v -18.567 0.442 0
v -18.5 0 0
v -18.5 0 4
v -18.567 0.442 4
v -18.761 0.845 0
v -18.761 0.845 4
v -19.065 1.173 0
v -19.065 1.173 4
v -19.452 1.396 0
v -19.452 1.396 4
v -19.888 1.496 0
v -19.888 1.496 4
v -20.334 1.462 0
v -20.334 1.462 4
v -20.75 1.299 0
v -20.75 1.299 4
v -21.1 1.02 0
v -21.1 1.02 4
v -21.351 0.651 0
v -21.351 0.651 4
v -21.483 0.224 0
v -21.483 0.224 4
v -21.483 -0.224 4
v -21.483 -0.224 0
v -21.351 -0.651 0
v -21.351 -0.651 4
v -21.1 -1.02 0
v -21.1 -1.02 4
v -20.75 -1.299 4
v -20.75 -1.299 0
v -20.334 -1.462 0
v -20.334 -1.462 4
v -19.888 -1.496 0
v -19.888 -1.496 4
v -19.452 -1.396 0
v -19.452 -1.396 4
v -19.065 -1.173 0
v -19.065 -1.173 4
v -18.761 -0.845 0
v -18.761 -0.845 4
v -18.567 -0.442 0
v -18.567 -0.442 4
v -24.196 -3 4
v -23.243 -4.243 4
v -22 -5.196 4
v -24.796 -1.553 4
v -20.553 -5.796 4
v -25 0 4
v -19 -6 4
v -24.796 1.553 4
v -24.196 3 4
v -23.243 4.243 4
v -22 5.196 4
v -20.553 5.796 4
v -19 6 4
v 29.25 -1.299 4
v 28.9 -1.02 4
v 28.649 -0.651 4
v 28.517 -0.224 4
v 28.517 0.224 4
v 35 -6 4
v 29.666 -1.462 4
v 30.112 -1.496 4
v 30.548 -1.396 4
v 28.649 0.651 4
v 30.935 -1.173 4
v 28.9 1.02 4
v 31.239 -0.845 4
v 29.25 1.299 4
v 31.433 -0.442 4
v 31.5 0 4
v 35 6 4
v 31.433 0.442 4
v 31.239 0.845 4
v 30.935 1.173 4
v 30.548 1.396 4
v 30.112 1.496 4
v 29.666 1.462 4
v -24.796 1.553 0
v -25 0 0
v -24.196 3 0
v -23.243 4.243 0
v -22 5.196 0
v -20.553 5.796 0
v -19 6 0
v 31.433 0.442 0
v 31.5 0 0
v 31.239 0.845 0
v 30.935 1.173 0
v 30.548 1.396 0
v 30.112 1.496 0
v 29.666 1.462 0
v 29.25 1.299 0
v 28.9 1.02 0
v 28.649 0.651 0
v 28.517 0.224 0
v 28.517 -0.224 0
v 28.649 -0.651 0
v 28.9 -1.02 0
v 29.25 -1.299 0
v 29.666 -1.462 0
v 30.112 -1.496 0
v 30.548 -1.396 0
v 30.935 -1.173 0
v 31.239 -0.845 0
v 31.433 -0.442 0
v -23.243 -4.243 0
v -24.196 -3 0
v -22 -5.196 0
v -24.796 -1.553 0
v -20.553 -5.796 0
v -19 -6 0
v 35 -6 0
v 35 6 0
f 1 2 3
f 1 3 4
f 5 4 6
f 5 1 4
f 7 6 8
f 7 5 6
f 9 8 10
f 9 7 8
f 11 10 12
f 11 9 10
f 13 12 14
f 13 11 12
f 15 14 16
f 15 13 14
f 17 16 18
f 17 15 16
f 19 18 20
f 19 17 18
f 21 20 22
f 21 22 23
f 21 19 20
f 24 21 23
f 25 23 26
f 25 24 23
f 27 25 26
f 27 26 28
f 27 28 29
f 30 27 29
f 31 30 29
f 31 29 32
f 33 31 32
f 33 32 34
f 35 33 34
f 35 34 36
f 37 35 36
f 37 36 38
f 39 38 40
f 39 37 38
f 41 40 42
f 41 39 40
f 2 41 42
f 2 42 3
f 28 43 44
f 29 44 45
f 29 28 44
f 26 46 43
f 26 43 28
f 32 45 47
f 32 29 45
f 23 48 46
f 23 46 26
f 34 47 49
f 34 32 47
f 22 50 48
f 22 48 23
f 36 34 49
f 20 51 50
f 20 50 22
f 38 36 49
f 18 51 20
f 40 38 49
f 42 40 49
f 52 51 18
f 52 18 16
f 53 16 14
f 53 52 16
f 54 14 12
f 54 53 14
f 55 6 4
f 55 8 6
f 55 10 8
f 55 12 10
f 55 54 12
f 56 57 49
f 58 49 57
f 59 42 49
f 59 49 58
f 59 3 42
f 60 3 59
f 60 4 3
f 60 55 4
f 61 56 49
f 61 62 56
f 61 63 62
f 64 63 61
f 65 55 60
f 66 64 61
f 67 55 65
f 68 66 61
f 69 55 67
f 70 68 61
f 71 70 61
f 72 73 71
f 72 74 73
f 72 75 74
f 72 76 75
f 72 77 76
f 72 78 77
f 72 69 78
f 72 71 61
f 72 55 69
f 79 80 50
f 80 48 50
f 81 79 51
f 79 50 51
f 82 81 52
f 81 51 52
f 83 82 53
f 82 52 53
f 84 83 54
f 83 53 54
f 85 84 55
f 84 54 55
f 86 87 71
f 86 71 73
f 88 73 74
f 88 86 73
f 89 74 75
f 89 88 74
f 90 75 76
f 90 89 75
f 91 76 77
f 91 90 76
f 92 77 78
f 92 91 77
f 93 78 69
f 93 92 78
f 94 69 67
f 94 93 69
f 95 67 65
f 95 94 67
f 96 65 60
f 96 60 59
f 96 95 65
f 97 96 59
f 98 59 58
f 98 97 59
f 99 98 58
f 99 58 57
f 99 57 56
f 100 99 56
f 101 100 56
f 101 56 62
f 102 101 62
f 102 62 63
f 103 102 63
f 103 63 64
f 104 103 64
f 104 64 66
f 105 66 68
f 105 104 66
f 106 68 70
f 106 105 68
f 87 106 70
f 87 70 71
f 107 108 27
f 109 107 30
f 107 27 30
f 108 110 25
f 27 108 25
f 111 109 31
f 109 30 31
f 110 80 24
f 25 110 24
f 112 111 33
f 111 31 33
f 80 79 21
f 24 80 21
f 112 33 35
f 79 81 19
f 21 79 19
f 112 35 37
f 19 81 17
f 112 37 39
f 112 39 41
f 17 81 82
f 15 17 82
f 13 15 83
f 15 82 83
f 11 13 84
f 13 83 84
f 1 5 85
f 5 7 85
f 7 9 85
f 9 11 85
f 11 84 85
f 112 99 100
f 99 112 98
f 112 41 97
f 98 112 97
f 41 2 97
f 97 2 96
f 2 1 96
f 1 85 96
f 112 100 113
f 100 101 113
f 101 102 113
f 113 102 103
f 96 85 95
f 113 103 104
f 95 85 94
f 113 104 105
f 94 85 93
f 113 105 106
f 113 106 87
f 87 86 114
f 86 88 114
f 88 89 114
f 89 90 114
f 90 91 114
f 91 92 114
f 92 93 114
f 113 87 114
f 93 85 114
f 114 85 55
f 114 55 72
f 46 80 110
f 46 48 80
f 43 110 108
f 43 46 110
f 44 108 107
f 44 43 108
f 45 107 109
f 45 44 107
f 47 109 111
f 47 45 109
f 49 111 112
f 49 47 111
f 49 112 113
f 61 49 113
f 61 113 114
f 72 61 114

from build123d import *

# Parameters (mm, degrees)
SKETCH_1_W      = 60
SKETCH_1_H      = 12
SKETCH_1_R      = 1.5
EXTRUDE_1_DEPTH = 4
FILLET_1_R      = 6


with BuildPart() as part:
    # 草图1 → 凸台-拉伸1 (new body)
    with BuildSketch(Plane.XY):
        with Locations((5, 0)):
            Rectangle(SKETCH_1_W, SKETCH_1_H)
        with Locations((-20, 0)):
            Circle(SKETCH_1_R, mode=Mode.SUBTRACT)
        with Locations((30, 0)):
            Circle(SKETCH_1_R, mode=Mode.SUBTRACT)
    extrude(amount=EXTRUDE_1_DEPTH)

    # 圆角1
    fillet_1_edges = [part.edges().sort_by_distance(p)[0] for p in [
        (-25, -6, 2),
        (-25, 6, 2),
    ]]
    fillet(fillet_1_edges, radius=FILLET_1_R - 0.0001)  # a hair under: the kernel refuses the full size


solid = part.part
